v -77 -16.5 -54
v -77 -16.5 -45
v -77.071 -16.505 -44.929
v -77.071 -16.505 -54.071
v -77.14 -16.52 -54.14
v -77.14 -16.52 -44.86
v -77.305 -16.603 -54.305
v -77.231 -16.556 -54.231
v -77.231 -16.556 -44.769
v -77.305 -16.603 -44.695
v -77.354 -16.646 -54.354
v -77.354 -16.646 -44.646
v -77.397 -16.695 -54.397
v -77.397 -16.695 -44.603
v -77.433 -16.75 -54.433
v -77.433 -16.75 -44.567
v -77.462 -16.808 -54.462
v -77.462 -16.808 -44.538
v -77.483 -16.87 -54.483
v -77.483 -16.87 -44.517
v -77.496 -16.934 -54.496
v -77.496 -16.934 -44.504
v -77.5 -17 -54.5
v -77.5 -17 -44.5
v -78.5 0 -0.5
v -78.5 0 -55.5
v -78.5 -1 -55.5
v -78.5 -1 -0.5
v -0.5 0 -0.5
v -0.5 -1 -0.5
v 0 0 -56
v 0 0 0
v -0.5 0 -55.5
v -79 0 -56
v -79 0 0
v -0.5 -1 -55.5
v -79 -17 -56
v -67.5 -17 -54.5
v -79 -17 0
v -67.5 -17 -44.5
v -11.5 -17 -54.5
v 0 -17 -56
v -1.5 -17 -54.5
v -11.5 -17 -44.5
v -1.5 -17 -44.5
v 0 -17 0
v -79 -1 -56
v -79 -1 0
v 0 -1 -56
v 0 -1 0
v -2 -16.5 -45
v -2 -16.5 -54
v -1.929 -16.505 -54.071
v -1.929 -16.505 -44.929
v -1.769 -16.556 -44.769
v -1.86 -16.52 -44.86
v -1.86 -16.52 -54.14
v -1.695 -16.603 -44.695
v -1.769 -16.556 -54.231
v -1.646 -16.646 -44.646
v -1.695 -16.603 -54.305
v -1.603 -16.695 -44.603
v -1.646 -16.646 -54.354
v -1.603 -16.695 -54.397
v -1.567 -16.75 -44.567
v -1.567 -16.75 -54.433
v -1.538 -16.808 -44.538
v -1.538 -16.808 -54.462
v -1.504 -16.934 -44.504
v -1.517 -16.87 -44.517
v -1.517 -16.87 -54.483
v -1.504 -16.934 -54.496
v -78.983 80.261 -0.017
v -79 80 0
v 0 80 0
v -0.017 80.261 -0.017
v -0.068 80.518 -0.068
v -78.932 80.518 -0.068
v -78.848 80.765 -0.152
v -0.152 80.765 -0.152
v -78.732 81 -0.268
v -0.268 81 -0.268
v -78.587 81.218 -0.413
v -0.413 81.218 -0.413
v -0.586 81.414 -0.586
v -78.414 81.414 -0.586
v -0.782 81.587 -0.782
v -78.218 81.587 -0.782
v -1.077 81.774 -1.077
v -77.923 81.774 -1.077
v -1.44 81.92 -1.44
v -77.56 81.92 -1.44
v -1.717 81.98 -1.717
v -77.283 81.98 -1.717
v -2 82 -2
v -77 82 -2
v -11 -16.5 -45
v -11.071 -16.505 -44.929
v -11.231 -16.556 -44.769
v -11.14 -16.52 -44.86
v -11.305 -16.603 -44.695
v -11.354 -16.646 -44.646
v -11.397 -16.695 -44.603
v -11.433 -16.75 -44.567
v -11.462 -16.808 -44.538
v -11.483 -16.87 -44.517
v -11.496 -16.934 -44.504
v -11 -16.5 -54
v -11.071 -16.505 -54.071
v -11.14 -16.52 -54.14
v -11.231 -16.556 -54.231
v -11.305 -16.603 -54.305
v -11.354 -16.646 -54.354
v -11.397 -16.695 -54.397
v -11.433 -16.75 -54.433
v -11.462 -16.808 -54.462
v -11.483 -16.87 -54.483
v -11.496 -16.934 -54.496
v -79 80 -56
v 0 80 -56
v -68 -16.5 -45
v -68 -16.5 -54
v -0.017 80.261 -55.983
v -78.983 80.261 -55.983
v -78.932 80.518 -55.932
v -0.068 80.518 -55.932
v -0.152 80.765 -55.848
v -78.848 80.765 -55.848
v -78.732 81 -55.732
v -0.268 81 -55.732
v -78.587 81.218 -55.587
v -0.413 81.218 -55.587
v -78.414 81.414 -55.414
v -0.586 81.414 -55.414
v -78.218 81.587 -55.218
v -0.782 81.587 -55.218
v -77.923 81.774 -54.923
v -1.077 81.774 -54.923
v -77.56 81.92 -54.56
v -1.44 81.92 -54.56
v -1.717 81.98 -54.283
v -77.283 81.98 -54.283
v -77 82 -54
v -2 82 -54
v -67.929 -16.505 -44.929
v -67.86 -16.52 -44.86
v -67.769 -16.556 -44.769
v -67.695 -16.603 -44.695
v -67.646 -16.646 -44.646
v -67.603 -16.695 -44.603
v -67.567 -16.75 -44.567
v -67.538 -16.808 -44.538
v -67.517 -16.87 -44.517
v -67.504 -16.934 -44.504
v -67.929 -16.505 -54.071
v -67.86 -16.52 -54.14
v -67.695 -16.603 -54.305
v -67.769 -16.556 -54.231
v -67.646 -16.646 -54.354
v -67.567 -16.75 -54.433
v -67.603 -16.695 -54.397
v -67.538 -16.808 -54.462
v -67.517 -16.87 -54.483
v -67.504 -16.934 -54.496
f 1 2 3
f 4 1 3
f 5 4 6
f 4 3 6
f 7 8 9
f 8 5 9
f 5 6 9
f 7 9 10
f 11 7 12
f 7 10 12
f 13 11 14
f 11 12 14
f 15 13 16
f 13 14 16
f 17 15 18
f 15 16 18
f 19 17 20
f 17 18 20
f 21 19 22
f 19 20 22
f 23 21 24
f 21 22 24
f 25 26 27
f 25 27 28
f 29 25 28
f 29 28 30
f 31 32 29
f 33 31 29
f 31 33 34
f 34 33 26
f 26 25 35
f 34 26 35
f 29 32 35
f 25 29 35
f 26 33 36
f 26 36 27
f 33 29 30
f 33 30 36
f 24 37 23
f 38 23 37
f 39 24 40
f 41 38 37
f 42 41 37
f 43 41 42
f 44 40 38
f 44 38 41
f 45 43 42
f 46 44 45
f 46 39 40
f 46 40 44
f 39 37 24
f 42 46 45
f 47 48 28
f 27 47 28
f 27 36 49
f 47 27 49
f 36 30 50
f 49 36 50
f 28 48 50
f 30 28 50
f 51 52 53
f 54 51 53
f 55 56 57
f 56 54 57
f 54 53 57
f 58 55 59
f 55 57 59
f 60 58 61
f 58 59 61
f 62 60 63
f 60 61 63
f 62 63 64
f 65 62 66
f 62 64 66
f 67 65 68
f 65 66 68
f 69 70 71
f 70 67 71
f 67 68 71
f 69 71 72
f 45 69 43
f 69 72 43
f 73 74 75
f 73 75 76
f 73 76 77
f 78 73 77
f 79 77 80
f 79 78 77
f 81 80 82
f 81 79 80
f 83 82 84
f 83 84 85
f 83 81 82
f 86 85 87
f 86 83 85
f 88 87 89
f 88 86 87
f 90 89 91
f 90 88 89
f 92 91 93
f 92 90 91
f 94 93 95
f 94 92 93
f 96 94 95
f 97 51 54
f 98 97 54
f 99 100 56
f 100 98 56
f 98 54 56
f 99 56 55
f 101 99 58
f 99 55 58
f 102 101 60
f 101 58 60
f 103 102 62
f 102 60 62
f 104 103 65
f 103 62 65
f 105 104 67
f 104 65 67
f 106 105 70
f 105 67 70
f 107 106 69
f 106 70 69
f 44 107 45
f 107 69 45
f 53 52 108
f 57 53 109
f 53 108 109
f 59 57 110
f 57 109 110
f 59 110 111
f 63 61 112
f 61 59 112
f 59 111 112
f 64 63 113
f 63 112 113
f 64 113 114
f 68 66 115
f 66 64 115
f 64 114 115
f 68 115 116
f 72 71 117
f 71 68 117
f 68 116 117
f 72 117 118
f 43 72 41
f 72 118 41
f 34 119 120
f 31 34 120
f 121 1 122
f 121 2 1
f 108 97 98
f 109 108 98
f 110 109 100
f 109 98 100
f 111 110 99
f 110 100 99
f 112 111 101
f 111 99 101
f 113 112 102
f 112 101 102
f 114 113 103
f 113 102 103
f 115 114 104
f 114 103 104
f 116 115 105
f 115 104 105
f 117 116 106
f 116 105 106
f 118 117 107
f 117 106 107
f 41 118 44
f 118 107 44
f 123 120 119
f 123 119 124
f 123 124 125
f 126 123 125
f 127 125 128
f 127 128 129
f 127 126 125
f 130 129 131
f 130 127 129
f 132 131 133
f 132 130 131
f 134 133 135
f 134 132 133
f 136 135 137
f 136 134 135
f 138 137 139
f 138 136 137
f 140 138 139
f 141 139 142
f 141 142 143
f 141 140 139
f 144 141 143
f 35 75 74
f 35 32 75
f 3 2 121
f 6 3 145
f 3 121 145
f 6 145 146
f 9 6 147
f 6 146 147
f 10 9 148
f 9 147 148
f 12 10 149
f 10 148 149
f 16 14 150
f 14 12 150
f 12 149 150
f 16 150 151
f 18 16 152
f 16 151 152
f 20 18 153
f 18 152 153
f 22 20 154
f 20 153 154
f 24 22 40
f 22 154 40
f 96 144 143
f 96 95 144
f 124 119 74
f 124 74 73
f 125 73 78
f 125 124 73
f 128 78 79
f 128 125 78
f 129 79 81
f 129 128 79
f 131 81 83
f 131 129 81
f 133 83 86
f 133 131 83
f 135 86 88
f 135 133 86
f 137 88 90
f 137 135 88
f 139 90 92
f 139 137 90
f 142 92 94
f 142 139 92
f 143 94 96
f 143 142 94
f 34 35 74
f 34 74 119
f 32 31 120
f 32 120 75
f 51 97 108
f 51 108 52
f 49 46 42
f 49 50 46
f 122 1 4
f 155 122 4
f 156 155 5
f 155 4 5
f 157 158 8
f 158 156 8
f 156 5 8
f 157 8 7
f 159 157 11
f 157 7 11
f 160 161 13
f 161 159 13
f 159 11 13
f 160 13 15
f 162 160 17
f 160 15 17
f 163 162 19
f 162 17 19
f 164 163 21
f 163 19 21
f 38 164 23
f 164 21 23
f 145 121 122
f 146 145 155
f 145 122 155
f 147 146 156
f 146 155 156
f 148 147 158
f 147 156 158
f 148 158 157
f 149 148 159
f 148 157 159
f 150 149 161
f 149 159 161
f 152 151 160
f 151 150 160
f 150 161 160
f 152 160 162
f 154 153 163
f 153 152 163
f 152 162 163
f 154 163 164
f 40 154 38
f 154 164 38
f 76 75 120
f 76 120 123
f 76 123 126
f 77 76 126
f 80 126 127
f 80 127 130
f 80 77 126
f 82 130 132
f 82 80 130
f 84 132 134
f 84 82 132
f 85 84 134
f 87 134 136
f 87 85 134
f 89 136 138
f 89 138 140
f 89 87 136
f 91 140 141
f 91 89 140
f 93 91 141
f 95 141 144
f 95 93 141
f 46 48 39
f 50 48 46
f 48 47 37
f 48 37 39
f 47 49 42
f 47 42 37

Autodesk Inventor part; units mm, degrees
ref_plane "YZ Plane" through (0, 0, 0) normal (1, 0, 0) x (0, 1, 0)
ref_plane "XZ Plane" through (0, 0, 0) normal (0, 1, 0) x (-1, 0, 0)
ref_plane "XY Plane" through (0, 0, 0) normal (0, 0, 1) x (1, 0, 0)
sketch "Sketch1" plane through (0, 0, 0) normal (0, 1, 0) x (-1, 0, 0)
  line L0 (0, 0) -> (79, 0)
  line L1 (79, 0) -> (79, -56)
  line L2 (79, -56) -> (0, -56)
  line L3 (0, -56) -> (0, 0)
  dimension "d0" = 56
  dimension "d1" = 79
extrude "Extrusion1" add sketch "Sketch1" along normal blind 82
sketch "Sketch4" plane through (0, 0, 0) normal (0, -1, 0) x (1, 0, 0)
  line L0 (-78.5, -0.5) -> (-0.5, -0.5)
  line L1 (-0.5, -0.5) -> (-0.5, -55.5)
  line L2 (-0.5, -55.5) -> (-78.5, -55.5)
  line L3 (-78.5, -55.5) -> (-78.5, -0.5)
  line L4 (-78.5, -0.5) -> (-0.5, -55.5) construction
  line L5 (-0.5, -0.5) -> (-78.5, -55.5) construction
  line L6 (0, 0) -> (-79, 0) projected
  line L7 (-79, 0) -> (-79, -56) projected
  line L8 (-79, -56) -> (0, -56) projected
  line L9 (0, -56) -> (0, 0) projected
  point P0 (-39.5, -28)
  dimension "d4" = 0.5
  dimension "d5" = 0.5
  dimension "d7" = 0.5
  dimension "d8" = 0.5
extrude "Extrusion2" add sketch "Sketch4" along normal blind 1 contours L0 L1 L2 L3
sketch "Sketch5" plane through (0, -1, 0) normal (0, -1, 0) x (1, 0, 0)
  line L0 (-79, 0) -> (0, 0)
  line L1 (0, 0) -> (0, -56)
  line L2 (0, -56) -> (-79, -56)
  line L3 (-79, -56) -> (-79, 0)
  line L4 (-79, 0) -> (0, -56) construction
  line L5 (0, 0) -> (-79, -56) construction
  line L6 (0, -56) -> (0, 0) projected
  line L7 (-79, -56) -> (0, -56) projected
  line L8 (0, 0) -> (-79, 0) projected
  line L9 (-79, 0) -> (-79, -56) projected
  point P0 (-39.5, -28)
extrude "Extrusion3" add sketch "Sketch5" along normal blind 16
fillet "Fillet1" radius 2 4 edges at (-39.5, 82, -56) (0, 82, -28) (-39.5, 82, 0) (-79, 82, -28)
sketch "Sketch6" plane through (0, -17, 0) normal (0, -1, 0) x (1, 0, 0)
  line L0 (-11.5, -44.5) -> (-1.5, -44.5)
  line L1 (-1.5, -44.5) -> (-1.5, -54.5)
  line L2 (-1.5, -54.5) -> (-11.5, -54.5)
  line L3 (-11.5, -54.5) -> (-11.5, -44.5)
  line L4 (-11.5, -44.5) -> (-1.5, -54.5) construction
  line L5 (-1.5, -44.5) -> (-11.5, -54.5) construction
  line L6 (0, -56) -> (0, 0) projected
  line L7 (-79, -56) -> (0, -56) projected
  line L8 (-79, 0) -> (-79, -56) projected
  line L9 (-77.5, -44.5) -> (-67.5, -44.5)
  line L10 (-67.5, -44.5) -> (-67.5, -54.5)
  line L11 (-67.5, -54.5) -> (-77.5, -54.5)
  line L12 (-77.5, -54.5) -> (-77.5, -44.5)
  line L13 (-77.5, -44.5) -> (-67.5, -54.5) construction
  line L14 (-67.5, -44.5) -> (-77.5, -54.5) construction
  point P0 (-6.5, -49.5)
  point P1 (-72.5, -49.5)
  dimension "d14" = 10
  dimension "d15" = 10
  dimension "d16" = 1.5
  dimension "d17" = 1.5
  dimension "d18" = 10
  dimension "d19" = 10
  dimension "d20" = 1.5
  dimension "d21" = 1.5
extrude "Extrusion4" cut sketch "Sketch6" against normal blind 0.5
fillet "Fillet2" radius 0.5 4 edges at (-72.5, -16.5, -44.5) (-77.5, -16.5, -49.5) (-72.5, -16.5, -54.5) (-67.5, -16.5, -49.5)
fillet "Fillet3" radius 0.5 4 edges at (-11.5, -16.5, -49.5) (-6.5, -16.5, -44.5) (-6.5, -16.5, -54.5) (-1.5, -16.5, -49.5)
properties part number "battery" material "ABS Plastic"
